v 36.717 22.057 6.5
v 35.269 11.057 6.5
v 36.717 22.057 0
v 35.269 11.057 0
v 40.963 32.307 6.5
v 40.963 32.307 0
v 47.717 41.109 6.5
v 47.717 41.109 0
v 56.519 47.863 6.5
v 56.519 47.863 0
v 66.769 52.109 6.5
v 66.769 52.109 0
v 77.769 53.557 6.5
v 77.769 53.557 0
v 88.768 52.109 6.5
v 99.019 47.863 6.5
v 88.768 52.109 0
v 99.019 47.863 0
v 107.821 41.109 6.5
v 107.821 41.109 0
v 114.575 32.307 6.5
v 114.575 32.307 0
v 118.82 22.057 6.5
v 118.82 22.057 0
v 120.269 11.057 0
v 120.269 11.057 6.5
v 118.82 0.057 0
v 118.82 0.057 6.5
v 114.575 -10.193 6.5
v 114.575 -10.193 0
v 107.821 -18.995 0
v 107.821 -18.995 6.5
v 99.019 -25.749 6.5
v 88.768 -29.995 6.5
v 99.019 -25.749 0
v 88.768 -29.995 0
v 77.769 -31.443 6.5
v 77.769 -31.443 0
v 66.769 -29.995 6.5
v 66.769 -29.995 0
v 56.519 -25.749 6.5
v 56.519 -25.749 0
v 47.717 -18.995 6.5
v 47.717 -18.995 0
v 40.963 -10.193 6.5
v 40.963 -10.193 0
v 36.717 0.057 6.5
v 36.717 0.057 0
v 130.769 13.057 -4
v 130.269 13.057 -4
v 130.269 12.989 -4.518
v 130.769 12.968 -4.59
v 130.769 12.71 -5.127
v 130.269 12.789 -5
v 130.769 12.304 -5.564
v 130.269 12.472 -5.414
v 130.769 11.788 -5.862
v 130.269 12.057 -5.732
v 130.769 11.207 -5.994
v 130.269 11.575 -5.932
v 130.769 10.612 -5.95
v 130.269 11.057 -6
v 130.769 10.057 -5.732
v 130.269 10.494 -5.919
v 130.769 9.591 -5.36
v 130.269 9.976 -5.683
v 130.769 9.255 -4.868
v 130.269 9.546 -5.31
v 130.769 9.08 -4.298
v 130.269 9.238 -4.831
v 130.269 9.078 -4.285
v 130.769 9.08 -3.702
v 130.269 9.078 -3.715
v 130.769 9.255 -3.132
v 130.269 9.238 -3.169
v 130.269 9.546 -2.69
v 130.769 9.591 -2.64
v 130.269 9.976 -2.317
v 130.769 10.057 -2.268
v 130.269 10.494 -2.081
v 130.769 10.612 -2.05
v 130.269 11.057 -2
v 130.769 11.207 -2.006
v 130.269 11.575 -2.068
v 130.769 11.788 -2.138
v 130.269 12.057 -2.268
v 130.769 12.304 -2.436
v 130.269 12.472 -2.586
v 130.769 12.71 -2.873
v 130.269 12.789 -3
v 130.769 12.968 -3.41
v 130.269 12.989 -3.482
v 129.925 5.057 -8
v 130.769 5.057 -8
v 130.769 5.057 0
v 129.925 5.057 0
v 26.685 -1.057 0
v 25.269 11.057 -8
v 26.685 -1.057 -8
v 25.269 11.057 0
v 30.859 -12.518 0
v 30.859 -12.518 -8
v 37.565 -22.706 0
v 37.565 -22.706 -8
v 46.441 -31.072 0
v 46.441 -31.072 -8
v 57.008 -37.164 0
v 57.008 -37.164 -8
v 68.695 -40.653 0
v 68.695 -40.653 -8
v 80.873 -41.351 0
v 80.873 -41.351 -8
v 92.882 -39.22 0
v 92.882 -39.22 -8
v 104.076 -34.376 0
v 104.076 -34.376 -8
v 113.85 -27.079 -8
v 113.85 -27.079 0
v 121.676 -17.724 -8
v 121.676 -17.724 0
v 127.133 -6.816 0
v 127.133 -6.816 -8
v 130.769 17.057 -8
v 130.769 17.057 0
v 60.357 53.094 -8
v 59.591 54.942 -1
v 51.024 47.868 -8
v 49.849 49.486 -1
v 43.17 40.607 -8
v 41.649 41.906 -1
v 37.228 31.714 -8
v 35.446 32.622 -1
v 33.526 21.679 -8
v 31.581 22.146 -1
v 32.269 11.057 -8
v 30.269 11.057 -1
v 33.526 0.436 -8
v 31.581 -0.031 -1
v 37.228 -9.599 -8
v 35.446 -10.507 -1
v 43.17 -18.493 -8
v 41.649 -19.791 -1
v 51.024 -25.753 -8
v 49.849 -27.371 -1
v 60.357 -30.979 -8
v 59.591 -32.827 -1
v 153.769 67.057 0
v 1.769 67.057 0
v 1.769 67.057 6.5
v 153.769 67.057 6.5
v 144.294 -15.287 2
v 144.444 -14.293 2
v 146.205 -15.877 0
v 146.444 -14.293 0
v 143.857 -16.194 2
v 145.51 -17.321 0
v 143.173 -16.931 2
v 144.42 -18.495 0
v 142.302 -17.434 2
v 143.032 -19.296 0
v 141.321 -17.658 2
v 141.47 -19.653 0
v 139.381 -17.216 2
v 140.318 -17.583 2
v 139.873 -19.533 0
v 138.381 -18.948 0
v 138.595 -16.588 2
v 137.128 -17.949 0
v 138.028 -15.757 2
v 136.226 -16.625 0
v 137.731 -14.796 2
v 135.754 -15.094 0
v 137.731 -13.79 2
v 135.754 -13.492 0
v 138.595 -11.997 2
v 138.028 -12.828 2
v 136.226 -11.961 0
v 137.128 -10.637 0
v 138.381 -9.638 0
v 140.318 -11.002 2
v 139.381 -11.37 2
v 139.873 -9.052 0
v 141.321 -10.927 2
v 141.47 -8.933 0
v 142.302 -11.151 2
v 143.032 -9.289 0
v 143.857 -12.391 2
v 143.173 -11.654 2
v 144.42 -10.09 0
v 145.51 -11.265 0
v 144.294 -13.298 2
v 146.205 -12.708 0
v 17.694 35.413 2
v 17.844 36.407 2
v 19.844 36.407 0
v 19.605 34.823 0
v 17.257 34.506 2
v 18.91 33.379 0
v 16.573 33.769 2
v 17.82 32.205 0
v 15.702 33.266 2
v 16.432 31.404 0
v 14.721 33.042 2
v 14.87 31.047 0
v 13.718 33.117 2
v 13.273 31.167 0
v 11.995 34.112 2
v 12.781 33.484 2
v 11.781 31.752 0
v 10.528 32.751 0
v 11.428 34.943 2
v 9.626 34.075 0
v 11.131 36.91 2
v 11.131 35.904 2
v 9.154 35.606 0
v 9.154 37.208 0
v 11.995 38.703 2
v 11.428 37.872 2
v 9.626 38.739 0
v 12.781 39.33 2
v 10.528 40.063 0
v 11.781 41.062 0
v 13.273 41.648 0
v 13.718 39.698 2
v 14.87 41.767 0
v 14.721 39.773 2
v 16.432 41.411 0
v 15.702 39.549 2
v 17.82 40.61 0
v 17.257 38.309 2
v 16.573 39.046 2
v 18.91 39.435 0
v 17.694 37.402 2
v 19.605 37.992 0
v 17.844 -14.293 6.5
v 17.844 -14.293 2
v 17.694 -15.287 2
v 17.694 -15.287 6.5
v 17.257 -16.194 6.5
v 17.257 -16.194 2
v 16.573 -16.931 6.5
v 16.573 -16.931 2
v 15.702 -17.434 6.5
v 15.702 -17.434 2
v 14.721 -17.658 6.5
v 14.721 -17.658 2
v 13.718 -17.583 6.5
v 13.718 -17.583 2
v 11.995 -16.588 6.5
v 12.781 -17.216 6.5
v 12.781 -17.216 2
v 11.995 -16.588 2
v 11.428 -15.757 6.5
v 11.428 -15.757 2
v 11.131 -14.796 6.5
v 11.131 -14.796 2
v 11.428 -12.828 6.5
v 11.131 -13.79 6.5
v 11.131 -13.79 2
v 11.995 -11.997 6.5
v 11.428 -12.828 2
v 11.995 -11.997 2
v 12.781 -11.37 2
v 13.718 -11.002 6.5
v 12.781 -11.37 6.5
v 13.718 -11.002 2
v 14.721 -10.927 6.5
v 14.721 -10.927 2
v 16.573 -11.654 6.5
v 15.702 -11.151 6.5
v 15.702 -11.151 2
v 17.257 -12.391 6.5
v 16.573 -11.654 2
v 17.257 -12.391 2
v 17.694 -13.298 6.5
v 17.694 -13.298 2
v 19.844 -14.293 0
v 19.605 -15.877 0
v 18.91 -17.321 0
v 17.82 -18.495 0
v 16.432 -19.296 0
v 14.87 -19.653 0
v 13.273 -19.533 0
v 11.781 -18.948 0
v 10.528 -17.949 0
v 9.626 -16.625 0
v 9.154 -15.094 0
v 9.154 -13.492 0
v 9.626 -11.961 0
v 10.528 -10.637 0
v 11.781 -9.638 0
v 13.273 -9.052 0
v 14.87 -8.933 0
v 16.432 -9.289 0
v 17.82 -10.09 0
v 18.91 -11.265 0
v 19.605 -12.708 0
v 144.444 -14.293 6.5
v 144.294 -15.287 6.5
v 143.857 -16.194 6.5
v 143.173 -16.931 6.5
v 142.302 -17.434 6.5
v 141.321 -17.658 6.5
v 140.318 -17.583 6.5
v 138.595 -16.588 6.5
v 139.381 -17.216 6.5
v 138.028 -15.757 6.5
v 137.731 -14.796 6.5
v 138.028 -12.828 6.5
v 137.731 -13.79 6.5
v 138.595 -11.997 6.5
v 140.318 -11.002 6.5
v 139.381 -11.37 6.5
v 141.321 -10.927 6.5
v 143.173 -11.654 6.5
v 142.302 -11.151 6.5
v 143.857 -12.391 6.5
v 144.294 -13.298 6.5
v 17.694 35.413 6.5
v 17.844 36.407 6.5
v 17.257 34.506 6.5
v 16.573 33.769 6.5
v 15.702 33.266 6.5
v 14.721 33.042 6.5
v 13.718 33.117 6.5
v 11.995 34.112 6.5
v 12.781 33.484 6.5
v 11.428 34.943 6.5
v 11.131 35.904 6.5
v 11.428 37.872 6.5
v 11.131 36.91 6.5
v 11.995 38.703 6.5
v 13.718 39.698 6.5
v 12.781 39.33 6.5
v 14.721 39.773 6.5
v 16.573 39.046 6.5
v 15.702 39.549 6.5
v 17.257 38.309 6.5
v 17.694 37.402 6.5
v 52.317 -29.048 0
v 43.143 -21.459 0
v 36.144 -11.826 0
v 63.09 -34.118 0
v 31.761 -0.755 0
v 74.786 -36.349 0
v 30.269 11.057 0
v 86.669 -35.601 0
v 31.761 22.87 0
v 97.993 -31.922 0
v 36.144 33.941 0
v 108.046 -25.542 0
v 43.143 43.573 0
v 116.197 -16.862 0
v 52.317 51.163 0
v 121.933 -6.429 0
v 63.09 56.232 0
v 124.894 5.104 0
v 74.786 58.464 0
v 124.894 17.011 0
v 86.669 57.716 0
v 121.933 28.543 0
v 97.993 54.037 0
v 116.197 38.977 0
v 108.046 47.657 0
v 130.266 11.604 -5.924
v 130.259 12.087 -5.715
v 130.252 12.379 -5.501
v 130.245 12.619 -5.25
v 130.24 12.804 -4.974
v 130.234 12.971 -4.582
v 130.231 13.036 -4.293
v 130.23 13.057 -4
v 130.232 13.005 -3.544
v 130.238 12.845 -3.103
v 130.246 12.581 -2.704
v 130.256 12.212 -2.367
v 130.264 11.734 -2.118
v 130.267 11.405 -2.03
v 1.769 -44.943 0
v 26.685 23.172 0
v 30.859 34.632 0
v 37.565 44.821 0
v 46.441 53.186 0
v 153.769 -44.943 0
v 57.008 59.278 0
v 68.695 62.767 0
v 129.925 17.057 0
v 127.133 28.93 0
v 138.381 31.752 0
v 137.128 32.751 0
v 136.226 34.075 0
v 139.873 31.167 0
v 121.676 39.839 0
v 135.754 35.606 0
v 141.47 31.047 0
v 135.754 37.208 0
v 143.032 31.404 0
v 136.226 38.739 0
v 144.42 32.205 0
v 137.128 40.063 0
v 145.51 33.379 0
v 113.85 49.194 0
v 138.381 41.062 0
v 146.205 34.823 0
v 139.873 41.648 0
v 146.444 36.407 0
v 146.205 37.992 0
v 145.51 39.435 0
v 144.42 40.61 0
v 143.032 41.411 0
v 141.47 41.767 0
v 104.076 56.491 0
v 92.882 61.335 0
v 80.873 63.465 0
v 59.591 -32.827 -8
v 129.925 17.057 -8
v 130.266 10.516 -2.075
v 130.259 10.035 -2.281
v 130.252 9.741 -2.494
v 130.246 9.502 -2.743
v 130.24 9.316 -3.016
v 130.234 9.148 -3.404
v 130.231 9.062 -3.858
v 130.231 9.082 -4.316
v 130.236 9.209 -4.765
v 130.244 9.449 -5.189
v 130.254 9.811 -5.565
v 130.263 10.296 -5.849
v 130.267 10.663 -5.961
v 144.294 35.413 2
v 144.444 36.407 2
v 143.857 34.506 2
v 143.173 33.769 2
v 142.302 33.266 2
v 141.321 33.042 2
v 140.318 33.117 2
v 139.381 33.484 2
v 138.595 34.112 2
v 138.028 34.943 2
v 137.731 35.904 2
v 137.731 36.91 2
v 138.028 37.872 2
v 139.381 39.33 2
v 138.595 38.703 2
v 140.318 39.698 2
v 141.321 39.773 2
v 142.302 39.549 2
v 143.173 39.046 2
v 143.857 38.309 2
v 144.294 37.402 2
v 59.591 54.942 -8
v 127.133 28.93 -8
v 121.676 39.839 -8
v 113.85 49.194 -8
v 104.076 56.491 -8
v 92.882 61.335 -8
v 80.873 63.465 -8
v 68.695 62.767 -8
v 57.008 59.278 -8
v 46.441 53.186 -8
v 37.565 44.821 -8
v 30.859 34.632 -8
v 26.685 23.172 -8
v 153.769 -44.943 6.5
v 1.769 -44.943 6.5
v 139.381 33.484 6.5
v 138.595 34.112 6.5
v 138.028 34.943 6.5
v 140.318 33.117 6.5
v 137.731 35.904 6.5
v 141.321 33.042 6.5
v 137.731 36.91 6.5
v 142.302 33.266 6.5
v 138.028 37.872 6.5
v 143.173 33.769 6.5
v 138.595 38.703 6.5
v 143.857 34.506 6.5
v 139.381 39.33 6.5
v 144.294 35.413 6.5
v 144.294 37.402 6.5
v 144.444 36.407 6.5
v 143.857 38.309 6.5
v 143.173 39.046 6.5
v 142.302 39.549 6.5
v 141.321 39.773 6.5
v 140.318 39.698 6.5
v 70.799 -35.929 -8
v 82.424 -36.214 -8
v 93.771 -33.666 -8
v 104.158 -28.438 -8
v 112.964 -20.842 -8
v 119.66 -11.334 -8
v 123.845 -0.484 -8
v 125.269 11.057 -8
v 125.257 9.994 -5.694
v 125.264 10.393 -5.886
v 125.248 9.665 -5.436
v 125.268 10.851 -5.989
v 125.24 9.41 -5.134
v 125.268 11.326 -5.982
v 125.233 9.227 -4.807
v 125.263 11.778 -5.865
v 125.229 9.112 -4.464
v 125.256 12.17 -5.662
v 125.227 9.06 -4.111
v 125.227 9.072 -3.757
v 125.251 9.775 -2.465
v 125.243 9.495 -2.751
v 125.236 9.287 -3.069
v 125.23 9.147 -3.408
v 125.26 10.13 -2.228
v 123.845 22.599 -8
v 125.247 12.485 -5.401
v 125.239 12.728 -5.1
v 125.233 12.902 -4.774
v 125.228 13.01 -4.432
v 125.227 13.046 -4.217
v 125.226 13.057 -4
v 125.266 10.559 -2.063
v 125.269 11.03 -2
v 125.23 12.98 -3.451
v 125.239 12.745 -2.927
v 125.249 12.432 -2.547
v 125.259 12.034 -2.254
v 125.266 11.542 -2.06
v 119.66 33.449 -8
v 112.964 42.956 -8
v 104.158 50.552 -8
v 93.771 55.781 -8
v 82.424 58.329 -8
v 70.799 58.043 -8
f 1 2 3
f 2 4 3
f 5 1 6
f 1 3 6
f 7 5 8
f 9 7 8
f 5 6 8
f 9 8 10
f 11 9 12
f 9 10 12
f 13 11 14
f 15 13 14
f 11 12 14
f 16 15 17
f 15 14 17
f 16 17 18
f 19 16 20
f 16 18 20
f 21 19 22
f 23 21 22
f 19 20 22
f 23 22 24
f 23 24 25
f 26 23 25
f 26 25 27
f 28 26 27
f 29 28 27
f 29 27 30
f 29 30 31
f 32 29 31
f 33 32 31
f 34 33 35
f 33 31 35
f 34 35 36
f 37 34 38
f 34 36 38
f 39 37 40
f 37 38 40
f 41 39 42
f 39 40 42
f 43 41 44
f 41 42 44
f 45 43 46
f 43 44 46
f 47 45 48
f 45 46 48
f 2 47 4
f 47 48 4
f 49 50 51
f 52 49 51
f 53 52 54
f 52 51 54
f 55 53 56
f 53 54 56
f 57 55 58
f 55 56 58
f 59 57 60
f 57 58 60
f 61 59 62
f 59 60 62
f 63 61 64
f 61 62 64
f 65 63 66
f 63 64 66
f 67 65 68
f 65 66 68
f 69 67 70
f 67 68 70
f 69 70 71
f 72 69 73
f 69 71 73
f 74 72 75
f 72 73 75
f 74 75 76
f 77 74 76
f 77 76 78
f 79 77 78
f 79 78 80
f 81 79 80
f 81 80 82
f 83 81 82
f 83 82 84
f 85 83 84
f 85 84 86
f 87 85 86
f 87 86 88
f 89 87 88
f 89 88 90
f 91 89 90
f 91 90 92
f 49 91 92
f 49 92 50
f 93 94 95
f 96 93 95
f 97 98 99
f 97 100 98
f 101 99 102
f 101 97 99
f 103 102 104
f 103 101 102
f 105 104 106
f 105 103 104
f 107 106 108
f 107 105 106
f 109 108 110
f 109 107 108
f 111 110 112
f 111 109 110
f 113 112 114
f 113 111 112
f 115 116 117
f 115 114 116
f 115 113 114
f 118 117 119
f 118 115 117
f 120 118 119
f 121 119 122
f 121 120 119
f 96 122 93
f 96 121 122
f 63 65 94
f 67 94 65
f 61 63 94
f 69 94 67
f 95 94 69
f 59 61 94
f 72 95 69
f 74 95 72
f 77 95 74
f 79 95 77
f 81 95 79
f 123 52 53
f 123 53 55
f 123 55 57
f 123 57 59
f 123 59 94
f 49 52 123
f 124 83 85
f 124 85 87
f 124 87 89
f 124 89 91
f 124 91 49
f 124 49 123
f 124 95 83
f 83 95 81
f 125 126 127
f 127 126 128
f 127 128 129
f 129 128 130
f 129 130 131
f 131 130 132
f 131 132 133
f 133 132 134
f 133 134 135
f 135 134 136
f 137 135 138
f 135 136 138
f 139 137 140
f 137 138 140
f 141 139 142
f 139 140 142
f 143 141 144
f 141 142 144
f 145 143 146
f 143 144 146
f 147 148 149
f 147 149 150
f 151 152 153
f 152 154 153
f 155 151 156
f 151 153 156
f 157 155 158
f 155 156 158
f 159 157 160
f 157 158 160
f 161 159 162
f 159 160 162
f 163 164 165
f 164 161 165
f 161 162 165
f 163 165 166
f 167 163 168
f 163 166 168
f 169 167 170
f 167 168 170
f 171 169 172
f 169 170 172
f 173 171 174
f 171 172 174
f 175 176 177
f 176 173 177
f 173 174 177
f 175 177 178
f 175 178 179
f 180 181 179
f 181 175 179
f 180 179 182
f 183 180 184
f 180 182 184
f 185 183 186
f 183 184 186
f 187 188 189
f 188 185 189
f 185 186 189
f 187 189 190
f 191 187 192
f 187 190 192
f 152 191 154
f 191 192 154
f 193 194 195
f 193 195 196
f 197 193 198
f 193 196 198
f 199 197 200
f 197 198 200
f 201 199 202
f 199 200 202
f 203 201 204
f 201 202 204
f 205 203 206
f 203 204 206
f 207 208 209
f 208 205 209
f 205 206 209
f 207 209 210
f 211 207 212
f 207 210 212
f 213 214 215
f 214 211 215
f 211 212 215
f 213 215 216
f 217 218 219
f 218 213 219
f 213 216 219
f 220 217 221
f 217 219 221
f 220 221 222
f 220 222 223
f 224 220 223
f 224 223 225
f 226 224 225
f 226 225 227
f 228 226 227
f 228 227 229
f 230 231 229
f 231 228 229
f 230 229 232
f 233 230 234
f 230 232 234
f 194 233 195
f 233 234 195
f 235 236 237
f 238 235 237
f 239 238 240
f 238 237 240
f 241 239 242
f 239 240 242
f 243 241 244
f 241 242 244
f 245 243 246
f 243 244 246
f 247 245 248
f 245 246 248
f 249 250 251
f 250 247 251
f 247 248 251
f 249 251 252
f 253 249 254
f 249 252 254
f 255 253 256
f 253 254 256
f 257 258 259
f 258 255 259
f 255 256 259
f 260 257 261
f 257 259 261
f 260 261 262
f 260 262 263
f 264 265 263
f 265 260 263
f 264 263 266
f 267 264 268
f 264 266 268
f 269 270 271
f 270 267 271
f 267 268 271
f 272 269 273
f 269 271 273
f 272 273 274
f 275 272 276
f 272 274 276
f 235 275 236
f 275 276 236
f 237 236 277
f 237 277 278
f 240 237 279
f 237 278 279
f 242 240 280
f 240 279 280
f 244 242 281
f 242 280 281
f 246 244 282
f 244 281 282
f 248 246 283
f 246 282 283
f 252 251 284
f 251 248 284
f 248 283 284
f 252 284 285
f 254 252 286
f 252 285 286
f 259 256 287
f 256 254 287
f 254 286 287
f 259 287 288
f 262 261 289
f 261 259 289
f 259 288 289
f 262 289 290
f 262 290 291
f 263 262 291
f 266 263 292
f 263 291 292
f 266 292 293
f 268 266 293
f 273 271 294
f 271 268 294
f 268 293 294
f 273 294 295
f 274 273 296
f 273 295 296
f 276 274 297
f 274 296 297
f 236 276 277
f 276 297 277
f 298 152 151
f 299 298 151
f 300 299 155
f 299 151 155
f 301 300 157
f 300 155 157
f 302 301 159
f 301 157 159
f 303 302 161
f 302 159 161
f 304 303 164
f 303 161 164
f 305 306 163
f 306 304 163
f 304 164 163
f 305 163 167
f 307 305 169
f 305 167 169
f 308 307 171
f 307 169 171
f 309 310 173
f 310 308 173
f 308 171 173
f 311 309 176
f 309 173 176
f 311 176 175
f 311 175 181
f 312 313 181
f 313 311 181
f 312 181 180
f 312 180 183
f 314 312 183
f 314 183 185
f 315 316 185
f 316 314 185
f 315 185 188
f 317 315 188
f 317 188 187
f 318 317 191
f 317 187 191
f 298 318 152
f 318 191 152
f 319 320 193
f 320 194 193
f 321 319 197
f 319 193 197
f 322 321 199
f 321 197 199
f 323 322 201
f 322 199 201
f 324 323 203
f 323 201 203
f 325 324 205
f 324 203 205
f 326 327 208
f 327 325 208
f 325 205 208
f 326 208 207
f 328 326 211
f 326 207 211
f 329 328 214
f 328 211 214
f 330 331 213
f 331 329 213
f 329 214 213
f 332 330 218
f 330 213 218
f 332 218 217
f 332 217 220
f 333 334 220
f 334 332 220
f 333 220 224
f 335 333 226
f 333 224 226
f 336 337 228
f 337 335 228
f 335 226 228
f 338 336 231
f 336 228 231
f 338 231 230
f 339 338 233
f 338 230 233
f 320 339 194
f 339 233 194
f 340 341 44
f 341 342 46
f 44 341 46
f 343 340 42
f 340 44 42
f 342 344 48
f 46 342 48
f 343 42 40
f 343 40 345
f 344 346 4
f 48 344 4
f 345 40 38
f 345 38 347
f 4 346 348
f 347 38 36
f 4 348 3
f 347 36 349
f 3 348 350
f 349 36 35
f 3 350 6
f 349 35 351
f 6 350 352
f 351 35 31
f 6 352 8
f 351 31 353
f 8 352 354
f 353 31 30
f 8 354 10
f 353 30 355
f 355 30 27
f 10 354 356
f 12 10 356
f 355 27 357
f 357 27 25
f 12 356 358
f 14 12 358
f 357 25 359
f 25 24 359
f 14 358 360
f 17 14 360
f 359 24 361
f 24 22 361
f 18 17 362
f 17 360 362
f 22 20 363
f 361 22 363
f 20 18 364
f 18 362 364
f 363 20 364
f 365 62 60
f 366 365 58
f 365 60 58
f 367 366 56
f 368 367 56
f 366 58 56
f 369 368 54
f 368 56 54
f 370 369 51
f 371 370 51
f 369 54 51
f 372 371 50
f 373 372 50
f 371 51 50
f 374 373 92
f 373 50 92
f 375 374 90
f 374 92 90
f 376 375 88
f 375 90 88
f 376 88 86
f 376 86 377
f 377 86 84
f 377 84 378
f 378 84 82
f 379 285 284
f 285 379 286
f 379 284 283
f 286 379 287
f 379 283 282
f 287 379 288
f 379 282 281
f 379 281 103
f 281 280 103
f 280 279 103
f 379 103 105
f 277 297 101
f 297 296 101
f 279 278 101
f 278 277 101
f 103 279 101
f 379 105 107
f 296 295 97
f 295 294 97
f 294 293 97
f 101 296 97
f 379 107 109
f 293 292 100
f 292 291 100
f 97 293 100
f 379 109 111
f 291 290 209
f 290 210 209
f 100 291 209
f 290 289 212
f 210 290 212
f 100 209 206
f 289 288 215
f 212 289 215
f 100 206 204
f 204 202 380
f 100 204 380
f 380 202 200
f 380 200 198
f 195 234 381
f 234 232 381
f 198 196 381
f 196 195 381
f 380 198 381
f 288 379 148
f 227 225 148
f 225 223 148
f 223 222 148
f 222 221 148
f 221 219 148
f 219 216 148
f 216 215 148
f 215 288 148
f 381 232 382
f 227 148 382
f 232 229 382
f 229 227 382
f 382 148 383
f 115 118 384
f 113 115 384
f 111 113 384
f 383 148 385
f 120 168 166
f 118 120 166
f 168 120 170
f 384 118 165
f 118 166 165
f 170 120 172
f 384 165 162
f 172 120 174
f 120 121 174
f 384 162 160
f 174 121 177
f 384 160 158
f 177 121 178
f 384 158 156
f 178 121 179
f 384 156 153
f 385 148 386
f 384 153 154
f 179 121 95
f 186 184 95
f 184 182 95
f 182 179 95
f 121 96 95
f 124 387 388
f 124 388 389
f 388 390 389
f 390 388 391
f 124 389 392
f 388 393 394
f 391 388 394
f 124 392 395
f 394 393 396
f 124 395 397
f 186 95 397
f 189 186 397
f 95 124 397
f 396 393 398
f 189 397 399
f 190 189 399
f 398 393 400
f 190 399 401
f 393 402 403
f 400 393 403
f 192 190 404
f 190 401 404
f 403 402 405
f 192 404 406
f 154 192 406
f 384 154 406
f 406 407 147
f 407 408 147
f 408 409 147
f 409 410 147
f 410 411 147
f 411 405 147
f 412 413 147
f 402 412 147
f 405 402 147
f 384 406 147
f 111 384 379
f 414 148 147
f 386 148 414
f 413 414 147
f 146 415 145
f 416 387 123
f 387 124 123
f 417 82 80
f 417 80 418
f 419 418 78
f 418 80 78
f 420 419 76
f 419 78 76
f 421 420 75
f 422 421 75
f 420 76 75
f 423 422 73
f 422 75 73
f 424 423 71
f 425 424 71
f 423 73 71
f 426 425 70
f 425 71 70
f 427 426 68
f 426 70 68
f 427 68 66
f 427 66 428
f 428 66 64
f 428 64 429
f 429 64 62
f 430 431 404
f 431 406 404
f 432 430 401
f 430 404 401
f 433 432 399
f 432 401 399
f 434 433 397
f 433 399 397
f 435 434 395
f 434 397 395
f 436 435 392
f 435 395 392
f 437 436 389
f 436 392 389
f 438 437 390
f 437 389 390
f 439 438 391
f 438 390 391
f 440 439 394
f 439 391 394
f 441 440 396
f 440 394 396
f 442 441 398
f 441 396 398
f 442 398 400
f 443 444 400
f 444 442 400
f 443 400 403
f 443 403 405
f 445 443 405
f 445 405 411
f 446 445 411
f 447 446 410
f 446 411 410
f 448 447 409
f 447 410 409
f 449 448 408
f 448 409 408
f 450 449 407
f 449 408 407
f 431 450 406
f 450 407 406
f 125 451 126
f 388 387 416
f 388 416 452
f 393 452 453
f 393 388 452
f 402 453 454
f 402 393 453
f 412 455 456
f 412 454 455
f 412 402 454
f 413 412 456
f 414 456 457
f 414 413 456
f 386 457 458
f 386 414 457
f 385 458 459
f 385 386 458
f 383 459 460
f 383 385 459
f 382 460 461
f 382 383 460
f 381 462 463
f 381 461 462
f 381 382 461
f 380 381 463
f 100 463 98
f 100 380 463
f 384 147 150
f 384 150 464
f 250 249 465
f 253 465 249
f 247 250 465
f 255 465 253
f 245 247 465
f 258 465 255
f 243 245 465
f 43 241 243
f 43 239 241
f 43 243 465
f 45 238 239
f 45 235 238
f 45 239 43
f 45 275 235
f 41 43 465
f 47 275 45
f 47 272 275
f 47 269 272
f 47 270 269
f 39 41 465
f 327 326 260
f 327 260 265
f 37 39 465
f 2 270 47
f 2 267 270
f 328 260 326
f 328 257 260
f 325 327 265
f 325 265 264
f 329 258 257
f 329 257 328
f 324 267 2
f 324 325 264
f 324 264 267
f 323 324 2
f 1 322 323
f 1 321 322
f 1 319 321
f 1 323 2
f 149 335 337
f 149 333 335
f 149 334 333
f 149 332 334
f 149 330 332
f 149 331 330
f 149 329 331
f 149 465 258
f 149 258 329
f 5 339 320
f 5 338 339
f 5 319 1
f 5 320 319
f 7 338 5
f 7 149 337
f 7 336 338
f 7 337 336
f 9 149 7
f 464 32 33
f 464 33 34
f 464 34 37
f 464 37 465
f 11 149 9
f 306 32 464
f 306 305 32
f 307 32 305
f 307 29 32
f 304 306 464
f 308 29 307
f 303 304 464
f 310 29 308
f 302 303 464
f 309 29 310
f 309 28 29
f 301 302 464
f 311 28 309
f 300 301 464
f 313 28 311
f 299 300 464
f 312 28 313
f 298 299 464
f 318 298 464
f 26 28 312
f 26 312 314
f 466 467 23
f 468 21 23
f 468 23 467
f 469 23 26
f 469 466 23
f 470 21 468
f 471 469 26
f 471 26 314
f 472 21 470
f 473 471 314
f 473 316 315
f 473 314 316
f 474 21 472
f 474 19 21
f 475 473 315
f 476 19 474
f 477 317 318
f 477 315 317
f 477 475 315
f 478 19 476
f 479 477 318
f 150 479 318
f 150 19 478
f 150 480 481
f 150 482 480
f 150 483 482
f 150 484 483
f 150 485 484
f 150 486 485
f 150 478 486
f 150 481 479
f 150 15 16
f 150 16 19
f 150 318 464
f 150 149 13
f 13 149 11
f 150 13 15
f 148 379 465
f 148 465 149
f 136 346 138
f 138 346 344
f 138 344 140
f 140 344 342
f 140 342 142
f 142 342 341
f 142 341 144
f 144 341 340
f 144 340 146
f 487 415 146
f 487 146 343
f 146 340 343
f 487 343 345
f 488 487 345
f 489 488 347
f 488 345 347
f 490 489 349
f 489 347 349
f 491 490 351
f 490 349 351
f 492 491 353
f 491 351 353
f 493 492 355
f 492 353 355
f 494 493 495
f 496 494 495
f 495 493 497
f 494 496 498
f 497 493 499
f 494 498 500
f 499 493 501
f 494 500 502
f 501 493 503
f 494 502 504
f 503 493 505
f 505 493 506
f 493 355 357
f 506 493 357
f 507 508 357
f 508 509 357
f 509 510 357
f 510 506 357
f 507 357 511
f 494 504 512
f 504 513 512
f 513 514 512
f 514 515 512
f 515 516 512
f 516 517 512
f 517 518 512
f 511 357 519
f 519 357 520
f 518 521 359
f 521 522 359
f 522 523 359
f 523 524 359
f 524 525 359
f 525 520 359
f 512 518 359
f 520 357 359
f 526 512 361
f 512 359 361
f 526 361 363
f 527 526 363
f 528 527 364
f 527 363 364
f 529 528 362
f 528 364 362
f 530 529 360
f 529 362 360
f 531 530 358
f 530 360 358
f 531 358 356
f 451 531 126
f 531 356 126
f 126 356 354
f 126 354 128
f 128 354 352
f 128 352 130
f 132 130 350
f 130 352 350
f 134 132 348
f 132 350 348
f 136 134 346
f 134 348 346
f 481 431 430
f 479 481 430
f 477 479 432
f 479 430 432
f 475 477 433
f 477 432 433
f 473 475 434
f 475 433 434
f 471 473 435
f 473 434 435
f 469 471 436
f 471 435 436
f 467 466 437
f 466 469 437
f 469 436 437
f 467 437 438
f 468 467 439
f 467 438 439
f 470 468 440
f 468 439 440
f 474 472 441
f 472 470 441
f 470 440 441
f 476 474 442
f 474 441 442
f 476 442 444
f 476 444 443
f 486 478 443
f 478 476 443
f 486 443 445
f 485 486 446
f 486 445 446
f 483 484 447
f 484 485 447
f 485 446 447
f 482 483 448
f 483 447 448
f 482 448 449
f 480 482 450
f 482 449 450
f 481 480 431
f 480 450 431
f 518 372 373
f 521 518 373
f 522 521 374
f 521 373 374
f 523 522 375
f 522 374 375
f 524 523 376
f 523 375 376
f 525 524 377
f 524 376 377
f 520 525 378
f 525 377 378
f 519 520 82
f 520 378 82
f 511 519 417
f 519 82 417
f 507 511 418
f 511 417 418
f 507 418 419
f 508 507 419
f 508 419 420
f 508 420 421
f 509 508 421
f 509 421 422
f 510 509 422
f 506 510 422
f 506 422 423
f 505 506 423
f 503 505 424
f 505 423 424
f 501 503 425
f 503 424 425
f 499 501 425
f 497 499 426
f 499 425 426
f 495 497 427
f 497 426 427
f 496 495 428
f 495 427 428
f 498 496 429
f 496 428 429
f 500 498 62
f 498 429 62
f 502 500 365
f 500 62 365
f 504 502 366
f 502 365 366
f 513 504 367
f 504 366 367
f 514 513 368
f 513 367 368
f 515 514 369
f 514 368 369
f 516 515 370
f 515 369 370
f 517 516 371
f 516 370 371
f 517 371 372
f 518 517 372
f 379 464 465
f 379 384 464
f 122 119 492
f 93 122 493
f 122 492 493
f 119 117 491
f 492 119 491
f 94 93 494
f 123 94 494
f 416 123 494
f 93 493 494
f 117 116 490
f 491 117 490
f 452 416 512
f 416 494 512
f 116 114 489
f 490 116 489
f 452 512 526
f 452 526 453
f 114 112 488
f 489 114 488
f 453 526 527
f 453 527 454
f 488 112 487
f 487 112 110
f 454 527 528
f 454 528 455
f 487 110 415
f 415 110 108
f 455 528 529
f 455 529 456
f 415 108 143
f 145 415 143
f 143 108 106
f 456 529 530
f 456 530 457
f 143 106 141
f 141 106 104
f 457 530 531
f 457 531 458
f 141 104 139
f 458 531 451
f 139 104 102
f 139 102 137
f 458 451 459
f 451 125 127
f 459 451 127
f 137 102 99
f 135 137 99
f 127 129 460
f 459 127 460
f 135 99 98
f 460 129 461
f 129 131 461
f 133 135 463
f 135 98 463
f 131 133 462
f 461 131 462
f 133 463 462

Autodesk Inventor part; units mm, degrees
ref_plane "YZ Plane" through (0, 0, 0) normal (1, 0, 0) x (0, 1, 0)
ref_plane "XZ Plane" through (0, 0, 0) normal (0, 1, 0) x (-1, 0, 0)
ref_plane "XY Plane" through (0, 0, 0) normal (0, 0, 1) x (1, 0, 0)
sketch "Sketch1" plane through (0, 0, 0) normal (0, 0, 1) x (1, 0, 0)
  line L0 (14.4686, 36.4073) -> (141.0686, 36.4073) construction
  line L1 (141.0686, 36.4073) -> (141.0686, -14.2927) construction
  line L2 (141.0686, -14.2927) -> (14.4686, -14.2927) construction
  line L3 (14.4686, -14.2927) -> (14.4686, 36.4073) construction
  circle A0 centre (14.4686, 36.4073) radius 3.375
  circle A1 centre (14.4686, -14.2927) radius 3.375
  circle A2 centre (141.0686, -14.2927) radius 3.375
  circle A3 centre (141.0686, 36.4073) radius 3.375
  line L4 (1.7686, 67.0573) -> (153.7686, 67.0573)
  line L5 (153.7686, 67.0573) -> (153.7686, -44.9427)
  line L6 (153.7686, -44.9427) -> (1.7686, -44.9427)
  line L7 (1.7686, -44.9427) -> (1.7686, 67.0573)
  line L8 (14.4686, 36.4073) -> (1.7686, 67.0573) construction
  line L9 (14.4686, -14.2927) -> (1.7686, -44.9427) construction
  line L10 (141.0686, -14.2927) -> (153.7686, -44.9427) construction
  line L11 (141.0686, 36.4073) -> (153.7686, 67.0573) construction
  line L12 (153.7686, 11.0573) -> (1.7686, 11.0573) construction
  point P0 (0, 0)
  dimension "d1" = 126.6
  dimension "d2" = 50.7
  dimension "d3" = 6.75
  dimension "d4" = 152
  dimension "d5" = 112
extrude "Extrusion1" add sketch "Sketch1" along normal blind 6.5
sketch "Sketch4" plane through (0, 0, 0) normal (0, 0, -1) x (-1, 0, 0)
  circle A0 centre (-77.7686, 11.0573) radius 47.5
  line L0 (-153.7686, 67.0573) -> (-1.7686, 67.0573) construction
  line L1 (-1.7686, -44.9427) -> (-153.7686, -44.9427) construction
  line L2 (-1.7686, 67.0573) -> (-153.7686, -44.9427) construction
  line L3 (-1.7686, -44.9427) -> (-153.7686, 67.0573) construction
  circle A1 centre (-77.7686, 11.0573) radius 52.5
  circle A2 centre (-77.7686, 11.0573) radius 42.5
  point P0 (0, 0)
  dimension "d12" = 95
  dimension "d13" = 5
  dimension "d34" = 5
extrude "Extrusion2" add sketch "Sketch4" along normal blind 8 contours A1
ref_plane "Work Plane3" through (1.7686, 11.0573, 0) normal (0, -1, 0) x (1, 0, 0)
sketch "Sketch6" plane through (1.7686, 11.0573, 0) normal (0, -1, 0) x (1, 0, 0)
  line L0 (28.5, 0) -> (28.5, -8) projected
  line L1 (123.5, -8) -> (28.5, -8) projected
  line L2 (28.5, -8) -> (30.5, -8)
  line L3 (30.5, -8) -> (28.5, -1)
  line L4 (28.5, -8) -> (28.5, -1)
  line L5 (76, -10.9) -> (76, 9.4) projected
  dimension "d16" = 2
  dimension "d17" = 7
revolve "Revolution1" add sketch "Sketch6" angle 135 mid plane about axis through (77.7686, 11.0573, -8) along (0, 0, 1)
ref_plane "Work Plane4" through (130.2686, 11.0573, 0) normal (1, 0, 0) x (0, 1, 0)
sketch "Sketch7" plane through (130.2686, 11.0573, 0) normal (1, 0, 0) x (0, 1, 0)
  line L0 (-52.5, -8) -> (52.5, -8) projected
  line L1 (56, 0) -> (-56, 0) projected
  line L2 (56, 0) -> (56, 6.5) projected
  line L3 (-56, 6.5) -> (56, 6.5) projected
  line L4 (-56, 0) -> (-56, 6.5) projected
  line L5 (47.5, -8) -> (-47.5, -8) projected
  line L6 (-47.5, 0) -> (47.5, 0) projected
  line L7 (6, -8) -> (-6, -8)
  line L8 (-6, -8) -> (-6, 0)
  line L9 (-6, 0) -> (6, 0)
  line L10 (6, 0) -> (6, -8)
  line L11 (0, -10.9) -> (0, 9.4) projected
  circle A0 centre (0, -4) radius 2
  point P0 (-11.0573, 0)
  point P1 (-43.8843, -8)
  point P2 (43.8843, -8)
  point P3 (0, -8)
  dimension "d23" = 12
  dimension "d24" = 4
extrude "Extrusion3" add sketch "Sketch7" against normal up to next contours L8 L1 L11 A0 L0 | L11 A0 L1 L10 L0
extrude "Extrusion4" add sketch "Sketch7" along normal blind 0.5 contours L8 L1 L11 A0 L0 | L11 A0 L1 L10 L0
extrude "Extrusion5" cut sketch "Sketch7" against normal up to next contours A0 L11 | L11 A0
chamfer "Chamfer1" distance 2 angle 45 4 edges at (11.0936, -14.2927, 0) (11.0936, 36.4073, 0) (137.6936, 36.4073, 0) (137.6936, -14.2927, 0)
extrude "Extrusion6" cut sketch "Sketch4" against normal through all contours A2
properties part number "AZ100 ASI LX-4000 stage adapter"
